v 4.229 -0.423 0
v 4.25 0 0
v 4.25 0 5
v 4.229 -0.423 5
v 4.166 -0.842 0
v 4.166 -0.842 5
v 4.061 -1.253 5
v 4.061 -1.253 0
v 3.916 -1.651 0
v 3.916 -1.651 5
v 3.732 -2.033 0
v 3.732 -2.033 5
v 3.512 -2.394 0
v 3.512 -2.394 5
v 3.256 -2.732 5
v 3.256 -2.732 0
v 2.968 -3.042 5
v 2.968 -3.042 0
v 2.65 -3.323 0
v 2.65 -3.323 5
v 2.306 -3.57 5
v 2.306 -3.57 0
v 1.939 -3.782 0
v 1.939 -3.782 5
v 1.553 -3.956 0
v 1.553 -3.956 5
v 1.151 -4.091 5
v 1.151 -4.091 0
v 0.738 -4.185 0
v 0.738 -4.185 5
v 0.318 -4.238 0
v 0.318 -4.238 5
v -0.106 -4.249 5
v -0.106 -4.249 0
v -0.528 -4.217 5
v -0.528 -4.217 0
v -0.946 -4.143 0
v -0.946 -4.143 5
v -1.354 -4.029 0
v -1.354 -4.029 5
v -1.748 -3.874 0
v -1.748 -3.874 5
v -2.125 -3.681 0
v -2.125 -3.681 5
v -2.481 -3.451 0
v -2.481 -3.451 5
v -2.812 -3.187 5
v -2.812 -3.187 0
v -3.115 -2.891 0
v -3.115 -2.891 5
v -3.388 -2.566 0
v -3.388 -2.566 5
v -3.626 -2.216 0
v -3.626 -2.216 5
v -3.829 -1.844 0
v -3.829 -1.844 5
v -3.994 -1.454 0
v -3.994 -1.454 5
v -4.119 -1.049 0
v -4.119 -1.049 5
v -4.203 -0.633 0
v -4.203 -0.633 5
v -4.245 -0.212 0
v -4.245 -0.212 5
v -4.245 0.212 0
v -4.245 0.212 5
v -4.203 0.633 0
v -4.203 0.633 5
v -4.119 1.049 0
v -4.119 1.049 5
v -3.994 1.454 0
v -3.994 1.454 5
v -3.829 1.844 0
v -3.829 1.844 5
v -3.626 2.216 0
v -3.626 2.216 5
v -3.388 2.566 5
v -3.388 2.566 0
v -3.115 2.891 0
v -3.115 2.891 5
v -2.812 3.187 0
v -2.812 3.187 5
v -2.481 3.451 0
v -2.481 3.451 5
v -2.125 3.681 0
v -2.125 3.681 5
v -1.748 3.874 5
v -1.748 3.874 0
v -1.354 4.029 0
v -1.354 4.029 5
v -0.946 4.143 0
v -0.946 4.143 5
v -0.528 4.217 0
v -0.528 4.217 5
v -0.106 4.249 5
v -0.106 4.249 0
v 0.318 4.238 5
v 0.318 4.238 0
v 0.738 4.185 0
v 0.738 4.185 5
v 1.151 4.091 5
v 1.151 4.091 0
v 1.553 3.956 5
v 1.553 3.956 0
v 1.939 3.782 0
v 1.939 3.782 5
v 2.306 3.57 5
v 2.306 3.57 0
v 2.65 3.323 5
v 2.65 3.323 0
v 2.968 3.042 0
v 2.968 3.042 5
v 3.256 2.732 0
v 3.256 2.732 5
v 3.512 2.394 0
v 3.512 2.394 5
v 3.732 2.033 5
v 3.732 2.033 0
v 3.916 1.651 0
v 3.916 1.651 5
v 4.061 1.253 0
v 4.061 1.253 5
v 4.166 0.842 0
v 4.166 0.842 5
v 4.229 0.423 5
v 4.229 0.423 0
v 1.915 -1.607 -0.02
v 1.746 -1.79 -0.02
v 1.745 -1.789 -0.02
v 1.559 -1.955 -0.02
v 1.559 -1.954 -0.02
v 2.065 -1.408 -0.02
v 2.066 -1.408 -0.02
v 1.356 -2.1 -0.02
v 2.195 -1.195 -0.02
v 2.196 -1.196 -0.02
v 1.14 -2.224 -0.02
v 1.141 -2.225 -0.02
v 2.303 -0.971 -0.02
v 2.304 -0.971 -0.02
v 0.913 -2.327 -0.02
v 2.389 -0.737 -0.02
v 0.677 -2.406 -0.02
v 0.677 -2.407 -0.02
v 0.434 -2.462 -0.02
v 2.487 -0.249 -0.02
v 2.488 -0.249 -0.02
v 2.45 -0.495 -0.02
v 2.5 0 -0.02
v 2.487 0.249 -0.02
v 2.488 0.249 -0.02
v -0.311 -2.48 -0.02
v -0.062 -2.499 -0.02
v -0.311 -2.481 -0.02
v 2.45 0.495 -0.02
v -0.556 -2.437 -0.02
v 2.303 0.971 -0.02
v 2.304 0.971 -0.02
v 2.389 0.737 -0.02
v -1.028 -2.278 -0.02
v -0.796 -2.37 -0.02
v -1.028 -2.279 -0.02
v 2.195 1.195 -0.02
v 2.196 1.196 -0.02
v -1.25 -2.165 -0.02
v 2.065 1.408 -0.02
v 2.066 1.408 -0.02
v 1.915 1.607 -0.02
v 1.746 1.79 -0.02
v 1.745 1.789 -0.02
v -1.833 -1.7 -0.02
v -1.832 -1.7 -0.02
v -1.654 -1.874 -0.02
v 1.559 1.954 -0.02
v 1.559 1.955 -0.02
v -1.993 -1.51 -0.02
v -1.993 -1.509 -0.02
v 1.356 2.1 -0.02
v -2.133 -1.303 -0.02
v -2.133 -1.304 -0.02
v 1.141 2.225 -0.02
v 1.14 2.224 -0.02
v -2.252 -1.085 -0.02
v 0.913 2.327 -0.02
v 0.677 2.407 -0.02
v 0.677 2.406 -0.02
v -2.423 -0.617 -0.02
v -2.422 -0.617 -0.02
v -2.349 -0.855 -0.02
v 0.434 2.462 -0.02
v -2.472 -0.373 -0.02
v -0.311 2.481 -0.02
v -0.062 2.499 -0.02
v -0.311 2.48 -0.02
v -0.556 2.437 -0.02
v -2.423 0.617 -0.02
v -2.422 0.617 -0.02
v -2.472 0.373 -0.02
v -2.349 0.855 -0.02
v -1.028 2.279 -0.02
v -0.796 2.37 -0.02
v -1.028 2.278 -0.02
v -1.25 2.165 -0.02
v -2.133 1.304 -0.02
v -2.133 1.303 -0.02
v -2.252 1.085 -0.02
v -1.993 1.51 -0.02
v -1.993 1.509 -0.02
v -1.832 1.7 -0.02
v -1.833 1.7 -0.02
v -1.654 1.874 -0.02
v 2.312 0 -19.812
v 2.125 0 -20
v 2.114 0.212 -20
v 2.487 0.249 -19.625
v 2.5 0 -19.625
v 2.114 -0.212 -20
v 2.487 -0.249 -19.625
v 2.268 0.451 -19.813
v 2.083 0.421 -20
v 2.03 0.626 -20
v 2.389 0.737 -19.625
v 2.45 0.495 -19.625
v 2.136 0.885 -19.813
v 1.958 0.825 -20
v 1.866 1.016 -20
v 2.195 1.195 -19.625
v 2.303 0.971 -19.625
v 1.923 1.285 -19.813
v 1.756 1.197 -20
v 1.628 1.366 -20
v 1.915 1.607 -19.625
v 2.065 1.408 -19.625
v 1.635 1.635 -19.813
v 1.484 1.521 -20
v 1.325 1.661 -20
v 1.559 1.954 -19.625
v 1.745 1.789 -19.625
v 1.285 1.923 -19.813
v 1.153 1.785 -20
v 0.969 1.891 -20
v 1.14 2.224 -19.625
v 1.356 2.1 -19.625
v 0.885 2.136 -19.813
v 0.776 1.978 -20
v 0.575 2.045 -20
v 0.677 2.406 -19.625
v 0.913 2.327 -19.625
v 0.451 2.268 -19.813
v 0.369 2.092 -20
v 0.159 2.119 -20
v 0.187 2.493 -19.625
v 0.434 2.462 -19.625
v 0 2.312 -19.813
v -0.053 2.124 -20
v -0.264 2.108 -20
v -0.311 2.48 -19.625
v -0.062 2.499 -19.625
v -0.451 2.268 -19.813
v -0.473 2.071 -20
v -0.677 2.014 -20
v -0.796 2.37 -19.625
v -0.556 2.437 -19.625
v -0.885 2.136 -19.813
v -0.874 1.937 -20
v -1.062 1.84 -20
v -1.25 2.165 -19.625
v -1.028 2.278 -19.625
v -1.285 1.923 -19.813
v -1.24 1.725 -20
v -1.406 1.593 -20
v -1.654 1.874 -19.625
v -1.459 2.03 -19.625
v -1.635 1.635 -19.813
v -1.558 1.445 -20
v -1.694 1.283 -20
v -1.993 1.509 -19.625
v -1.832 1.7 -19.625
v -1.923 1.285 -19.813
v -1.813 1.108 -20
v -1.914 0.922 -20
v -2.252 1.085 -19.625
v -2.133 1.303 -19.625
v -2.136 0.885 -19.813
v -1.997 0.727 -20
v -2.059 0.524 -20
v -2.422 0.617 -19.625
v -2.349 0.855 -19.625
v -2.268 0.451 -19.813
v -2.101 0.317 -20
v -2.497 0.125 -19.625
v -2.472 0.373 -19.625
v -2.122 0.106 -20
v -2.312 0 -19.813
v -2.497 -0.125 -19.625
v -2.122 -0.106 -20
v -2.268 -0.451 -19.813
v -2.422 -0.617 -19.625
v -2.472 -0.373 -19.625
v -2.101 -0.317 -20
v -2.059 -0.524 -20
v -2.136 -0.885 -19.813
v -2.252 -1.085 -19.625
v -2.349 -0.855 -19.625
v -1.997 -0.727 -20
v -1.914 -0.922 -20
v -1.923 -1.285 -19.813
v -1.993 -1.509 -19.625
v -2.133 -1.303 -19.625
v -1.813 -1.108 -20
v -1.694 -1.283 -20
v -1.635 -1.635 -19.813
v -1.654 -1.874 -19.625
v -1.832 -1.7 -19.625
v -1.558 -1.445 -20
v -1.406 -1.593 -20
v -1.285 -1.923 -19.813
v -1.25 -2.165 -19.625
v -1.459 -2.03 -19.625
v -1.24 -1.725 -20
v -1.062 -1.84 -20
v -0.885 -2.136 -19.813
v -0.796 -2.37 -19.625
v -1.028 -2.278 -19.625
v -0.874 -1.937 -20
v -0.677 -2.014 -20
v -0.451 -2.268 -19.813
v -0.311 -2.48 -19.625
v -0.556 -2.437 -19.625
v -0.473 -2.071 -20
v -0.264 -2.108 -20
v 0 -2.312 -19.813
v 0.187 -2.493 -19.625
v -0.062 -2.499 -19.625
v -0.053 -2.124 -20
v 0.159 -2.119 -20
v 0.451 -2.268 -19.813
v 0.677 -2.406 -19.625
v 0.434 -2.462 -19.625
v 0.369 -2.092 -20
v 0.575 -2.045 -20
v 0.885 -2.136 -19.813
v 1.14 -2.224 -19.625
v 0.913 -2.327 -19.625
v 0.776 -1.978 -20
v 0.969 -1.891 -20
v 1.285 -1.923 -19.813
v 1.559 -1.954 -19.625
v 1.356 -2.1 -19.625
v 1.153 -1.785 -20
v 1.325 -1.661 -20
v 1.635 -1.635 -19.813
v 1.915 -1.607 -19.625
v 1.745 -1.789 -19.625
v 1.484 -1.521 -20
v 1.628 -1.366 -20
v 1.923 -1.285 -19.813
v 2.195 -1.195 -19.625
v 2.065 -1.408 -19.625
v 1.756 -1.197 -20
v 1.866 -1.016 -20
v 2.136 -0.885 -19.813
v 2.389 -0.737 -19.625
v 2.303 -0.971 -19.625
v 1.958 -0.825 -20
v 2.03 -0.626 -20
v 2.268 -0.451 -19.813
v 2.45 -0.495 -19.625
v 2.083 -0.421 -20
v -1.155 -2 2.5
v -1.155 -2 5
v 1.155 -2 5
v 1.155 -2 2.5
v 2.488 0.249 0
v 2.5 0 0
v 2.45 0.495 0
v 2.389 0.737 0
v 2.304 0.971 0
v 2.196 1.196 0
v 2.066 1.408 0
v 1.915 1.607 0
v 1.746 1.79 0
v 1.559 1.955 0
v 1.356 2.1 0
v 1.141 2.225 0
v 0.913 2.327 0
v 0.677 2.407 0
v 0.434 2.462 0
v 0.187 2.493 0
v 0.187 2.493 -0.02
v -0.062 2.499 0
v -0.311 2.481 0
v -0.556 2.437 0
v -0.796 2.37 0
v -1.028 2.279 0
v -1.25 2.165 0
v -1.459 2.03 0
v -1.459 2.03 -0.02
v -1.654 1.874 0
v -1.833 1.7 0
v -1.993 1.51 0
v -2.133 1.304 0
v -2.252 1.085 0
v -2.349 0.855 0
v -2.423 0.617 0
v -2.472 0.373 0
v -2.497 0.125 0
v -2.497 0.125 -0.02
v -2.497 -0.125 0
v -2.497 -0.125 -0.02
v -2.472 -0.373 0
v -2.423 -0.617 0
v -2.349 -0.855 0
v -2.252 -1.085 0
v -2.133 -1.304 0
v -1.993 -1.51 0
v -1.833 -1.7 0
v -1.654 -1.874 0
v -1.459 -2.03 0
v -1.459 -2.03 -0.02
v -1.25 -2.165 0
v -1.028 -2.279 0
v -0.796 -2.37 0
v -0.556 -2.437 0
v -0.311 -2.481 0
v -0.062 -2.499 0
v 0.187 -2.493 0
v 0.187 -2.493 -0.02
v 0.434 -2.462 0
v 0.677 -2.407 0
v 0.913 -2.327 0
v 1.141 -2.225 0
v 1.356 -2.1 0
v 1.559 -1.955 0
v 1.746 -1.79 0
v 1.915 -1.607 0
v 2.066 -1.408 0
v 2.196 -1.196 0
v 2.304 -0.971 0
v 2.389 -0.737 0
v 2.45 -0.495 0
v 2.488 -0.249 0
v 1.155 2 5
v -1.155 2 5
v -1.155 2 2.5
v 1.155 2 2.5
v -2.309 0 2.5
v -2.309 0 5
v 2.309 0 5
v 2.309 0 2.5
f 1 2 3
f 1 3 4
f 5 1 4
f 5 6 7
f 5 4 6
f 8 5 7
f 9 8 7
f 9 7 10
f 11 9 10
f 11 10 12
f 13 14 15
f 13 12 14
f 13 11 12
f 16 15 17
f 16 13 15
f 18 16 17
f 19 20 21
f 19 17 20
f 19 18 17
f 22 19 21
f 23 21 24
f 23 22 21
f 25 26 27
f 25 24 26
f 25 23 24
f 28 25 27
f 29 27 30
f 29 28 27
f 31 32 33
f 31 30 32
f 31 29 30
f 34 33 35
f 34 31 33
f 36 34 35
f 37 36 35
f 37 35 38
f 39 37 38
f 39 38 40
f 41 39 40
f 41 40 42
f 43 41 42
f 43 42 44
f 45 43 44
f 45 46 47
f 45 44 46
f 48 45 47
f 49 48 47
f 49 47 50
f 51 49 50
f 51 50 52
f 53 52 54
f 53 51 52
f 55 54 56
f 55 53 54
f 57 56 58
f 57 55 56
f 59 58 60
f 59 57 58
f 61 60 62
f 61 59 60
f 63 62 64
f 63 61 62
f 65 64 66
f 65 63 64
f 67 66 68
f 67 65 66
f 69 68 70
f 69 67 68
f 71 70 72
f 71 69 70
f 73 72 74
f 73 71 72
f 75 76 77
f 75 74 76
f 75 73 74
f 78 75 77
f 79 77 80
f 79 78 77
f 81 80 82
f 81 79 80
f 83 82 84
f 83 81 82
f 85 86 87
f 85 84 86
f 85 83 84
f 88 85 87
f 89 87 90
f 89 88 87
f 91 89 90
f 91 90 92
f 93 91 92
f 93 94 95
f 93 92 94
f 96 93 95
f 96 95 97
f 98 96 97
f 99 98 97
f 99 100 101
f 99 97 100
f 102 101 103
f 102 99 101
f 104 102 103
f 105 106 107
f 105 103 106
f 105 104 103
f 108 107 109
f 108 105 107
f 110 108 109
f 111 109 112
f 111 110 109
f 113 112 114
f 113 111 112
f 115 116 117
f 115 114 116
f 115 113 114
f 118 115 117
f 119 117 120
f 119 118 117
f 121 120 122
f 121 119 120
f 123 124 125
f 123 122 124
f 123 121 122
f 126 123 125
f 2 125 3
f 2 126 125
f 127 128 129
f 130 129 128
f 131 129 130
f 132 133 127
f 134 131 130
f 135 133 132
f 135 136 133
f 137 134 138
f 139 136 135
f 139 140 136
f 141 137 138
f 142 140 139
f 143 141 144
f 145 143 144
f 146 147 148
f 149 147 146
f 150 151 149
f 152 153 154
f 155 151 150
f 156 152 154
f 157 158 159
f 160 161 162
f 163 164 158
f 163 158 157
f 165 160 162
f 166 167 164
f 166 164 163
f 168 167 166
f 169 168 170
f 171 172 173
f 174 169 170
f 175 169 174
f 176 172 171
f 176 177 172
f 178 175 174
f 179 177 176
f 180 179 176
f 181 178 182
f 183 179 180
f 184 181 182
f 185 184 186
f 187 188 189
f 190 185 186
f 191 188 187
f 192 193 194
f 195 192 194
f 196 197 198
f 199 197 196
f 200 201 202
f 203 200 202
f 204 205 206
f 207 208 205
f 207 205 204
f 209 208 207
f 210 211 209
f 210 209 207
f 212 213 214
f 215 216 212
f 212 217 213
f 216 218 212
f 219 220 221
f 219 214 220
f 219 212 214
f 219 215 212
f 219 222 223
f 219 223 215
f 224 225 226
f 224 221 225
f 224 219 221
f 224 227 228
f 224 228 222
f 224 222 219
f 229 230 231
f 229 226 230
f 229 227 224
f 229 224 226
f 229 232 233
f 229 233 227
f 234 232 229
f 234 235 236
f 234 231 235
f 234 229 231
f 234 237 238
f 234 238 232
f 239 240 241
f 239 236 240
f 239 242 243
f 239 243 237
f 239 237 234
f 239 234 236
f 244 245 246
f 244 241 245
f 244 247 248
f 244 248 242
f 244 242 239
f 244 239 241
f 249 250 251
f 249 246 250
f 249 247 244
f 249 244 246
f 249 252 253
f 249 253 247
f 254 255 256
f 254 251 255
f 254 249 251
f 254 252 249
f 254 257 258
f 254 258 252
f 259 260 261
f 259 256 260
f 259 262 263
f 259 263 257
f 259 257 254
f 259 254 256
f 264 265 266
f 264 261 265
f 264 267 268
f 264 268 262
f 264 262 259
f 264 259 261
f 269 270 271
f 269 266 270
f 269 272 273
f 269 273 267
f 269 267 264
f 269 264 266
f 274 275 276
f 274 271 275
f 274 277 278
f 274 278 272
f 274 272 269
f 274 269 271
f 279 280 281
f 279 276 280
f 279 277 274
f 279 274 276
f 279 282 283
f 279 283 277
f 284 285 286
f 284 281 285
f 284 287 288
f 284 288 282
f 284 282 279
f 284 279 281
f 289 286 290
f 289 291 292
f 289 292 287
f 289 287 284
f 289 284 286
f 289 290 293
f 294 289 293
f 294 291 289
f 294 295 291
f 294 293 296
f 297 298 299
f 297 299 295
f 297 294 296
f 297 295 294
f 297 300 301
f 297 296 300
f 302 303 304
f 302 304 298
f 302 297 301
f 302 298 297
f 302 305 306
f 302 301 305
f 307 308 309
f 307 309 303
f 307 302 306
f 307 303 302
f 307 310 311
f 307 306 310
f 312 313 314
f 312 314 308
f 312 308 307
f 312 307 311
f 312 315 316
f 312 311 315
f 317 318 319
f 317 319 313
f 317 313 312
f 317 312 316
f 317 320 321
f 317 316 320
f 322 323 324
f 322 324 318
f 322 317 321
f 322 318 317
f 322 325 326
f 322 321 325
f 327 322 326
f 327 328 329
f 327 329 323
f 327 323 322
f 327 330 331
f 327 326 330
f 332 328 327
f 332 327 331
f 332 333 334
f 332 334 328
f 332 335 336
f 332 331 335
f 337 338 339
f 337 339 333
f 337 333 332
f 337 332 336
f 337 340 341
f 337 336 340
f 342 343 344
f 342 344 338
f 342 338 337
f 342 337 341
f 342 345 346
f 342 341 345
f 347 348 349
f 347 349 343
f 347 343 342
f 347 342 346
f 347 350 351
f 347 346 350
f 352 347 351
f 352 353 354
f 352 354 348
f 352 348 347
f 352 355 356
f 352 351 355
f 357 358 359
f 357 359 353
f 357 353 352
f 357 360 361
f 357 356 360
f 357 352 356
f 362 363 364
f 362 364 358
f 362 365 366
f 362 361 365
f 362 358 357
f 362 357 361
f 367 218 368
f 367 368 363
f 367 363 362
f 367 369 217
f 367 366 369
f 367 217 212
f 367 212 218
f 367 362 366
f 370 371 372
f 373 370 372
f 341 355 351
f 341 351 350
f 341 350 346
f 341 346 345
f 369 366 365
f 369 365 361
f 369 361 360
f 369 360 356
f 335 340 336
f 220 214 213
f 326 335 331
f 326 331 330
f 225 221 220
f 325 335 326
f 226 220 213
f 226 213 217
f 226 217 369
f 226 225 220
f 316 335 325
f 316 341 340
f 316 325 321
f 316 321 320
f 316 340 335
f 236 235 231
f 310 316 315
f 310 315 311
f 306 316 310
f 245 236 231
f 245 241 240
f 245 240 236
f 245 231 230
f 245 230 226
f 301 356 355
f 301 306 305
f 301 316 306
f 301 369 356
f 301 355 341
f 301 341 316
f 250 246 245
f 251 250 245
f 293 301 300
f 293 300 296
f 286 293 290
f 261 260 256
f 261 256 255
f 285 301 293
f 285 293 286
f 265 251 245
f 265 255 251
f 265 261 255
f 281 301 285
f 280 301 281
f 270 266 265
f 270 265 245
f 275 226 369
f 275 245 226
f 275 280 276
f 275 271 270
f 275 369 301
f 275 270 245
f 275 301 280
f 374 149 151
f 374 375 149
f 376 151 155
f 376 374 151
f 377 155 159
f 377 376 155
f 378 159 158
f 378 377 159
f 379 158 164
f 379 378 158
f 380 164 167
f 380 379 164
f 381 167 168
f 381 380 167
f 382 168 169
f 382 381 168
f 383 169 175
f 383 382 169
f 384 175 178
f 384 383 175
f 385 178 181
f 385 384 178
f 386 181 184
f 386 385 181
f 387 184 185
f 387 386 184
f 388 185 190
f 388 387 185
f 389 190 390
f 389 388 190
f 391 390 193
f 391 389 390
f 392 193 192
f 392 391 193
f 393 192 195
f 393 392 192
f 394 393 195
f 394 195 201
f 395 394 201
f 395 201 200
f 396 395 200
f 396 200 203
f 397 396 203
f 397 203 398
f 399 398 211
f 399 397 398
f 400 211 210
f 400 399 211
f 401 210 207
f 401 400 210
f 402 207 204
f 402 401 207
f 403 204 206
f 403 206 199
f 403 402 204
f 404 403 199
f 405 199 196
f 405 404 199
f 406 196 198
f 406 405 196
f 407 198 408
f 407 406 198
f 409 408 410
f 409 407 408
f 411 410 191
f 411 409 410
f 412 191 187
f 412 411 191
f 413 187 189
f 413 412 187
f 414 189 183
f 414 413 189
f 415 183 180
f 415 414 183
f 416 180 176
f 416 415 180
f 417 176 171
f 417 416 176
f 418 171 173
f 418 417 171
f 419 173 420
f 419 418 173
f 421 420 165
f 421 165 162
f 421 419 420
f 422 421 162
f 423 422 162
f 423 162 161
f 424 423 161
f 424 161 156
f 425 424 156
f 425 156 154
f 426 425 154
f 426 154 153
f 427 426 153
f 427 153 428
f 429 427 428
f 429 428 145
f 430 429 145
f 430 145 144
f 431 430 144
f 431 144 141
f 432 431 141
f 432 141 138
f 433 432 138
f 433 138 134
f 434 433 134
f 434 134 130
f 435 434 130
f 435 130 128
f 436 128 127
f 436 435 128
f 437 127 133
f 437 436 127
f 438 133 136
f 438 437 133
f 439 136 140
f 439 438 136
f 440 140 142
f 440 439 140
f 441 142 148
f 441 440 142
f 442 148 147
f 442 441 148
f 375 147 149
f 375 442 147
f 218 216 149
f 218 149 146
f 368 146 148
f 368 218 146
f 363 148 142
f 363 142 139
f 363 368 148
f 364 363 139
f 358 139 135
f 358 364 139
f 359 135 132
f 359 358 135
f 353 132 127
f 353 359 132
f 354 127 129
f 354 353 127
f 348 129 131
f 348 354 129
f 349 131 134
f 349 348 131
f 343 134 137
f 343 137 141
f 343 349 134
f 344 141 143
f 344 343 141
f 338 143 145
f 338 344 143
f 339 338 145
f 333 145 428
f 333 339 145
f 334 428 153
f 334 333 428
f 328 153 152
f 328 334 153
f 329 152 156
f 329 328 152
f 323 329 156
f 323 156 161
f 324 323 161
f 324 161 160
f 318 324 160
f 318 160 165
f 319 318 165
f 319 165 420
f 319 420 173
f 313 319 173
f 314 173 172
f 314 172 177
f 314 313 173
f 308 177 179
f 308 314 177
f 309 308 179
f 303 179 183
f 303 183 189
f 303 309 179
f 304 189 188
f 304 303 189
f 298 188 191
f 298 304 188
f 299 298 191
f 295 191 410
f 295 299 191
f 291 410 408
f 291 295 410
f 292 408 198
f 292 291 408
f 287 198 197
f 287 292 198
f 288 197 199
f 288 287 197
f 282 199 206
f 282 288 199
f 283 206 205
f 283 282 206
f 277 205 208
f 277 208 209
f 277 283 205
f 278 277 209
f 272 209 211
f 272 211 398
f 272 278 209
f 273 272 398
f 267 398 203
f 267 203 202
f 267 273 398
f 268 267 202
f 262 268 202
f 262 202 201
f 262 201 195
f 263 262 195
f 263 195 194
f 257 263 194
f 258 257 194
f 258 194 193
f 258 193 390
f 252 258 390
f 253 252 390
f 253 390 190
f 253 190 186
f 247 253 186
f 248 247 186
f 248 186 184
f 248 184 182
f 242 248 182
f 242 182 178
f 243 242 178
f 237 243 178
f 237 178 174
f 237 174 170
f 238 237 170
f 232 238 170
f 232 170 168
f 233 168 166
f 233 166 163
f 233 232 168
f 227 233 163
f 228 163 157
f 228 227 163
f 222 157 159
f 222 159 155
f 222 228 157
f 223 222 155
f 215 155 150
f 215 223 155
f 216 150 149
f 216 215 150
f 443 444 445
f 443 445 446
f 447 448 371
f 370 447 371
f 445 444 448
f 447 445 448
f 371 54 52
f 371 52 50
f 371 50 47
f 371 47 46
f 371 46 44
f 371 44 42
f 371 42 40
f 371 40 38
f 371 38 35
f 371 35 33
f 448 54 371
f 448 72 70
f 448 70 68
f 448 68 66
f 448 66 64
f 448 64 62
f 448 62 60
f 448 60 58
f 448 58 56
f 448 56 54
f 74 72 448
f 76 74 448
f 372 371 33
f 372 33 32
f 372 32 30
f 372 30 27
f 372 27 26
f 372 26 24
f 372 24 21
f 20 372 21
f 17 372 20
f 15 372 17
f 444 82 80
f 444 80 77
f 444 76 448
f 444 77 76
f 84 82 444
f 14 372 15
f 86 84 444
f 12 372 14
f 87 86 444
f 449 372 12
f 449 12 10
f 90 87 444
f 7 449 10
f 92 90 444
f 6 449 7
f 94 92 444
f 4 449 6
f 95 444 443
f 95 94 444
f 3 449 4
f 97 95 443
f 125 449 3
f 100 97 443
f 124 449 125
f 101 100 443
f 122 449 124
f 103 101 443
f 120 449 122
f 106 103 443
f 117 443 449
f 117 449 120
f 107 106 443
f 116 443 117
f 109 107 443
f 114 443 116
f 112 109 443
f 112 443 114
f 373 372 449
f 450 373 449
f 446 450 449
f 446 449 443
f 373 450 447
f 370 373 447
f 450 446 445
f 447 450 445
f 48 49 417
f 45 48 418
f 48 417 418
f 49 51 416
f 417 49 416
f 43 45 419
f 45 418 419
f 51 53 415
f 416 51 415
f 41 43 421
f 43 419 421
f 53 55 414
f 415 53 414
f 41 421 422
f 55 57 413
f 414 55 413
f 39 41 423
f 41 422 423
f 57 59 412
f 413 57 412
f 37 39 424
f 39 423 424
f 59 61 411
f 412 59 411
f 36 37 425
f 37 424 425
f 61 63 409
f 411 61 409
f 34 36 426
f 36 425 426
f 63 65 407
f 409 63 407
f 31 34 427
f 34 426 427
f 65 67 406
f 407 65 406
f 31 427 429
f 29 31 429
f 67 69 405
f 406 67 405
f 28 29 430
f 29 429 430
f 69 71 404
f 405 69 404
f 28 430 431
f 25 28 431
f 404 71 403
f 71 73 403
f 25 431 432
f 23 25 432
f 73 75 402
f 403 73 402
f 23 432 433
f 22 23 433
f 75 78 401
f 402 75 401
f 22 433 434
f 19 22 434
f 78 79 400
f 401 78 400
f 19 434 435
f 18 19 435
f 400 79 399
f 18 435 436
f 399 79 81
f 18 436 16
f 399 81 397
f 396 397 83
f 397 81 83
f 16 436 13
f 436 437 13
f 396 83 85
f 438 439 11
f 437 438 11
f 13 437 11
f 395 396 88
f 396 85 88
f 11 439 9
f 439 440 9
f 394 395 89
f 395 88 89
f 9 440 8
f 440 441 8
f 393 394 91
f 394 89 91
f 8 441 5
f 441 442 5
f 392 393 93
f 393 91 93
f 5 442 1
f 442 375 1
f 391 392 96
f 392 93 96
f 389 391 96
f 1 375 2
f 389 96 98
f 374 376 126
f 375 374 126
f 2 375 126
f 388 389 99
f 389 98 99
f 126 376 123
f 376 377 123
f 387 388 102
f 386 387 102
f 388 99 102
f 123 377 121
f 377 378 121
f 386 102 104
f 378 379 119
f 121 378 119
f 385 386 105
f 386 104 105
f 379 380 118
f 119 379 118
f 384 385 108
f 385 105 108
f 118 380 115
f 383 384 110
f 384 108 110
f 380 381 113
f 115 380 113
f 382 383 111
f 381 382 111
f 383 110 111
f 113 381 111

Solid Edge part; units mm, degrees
sketch "Sketch1" plane through (0, 0, 0) normal (0, 0, 1) x (1, 0, 0)
  circle A0 centre (0, 0) radius 4.25
  dimension "D1" = 8.5
extrude "Protrusion1" add sketch "Sketch1" along normal blind 5
sketch "Sketch2" plane through (0, 0, 0) normal (0, 0, -1) x (1, 0, 0)
  circle A0 centre (0, 0) radius 2.5
extrude "Protrusion2" add sketch "Sketch2" along normal blind 20
sketch "Sketch3" plane through (0, 0, -20) normal (0, 0, -1) x (1, 0, 0)
  circle A0 centre (0, 0) radius 2.4997
extrude "Cutout1" cut sketch "Sketch3" against normal blind 19.98 flip side to cut
chamfer "Chamfer_1" distance 0.375 angle 45 1 edges at (-2.4997, 0, -20)
sketch "Sketch4" plane through (0, 0, 5) normal (0, 0, 1) x (1, 0, 0)
  line L0 (-1.1547, 2) -> (1.1547, 2)
  line L1 (2.3094, 0) -> (1.1547, 2)
  line L2 (1.1547, -2) -> (2.3094, 0)
  line L3 (-1.1547, -2) -> (1.1547, -2)
  line L4 (-2.3094, 0) -> (-1.1547, -2)
  line L5 (-1.1547, 2) -> (-2.3094, 0)
  dimension "D1" = 4
extrude "Cutout2" cut sketch "Sketch4" against normal blind 2.5
properties part number "24104804"
